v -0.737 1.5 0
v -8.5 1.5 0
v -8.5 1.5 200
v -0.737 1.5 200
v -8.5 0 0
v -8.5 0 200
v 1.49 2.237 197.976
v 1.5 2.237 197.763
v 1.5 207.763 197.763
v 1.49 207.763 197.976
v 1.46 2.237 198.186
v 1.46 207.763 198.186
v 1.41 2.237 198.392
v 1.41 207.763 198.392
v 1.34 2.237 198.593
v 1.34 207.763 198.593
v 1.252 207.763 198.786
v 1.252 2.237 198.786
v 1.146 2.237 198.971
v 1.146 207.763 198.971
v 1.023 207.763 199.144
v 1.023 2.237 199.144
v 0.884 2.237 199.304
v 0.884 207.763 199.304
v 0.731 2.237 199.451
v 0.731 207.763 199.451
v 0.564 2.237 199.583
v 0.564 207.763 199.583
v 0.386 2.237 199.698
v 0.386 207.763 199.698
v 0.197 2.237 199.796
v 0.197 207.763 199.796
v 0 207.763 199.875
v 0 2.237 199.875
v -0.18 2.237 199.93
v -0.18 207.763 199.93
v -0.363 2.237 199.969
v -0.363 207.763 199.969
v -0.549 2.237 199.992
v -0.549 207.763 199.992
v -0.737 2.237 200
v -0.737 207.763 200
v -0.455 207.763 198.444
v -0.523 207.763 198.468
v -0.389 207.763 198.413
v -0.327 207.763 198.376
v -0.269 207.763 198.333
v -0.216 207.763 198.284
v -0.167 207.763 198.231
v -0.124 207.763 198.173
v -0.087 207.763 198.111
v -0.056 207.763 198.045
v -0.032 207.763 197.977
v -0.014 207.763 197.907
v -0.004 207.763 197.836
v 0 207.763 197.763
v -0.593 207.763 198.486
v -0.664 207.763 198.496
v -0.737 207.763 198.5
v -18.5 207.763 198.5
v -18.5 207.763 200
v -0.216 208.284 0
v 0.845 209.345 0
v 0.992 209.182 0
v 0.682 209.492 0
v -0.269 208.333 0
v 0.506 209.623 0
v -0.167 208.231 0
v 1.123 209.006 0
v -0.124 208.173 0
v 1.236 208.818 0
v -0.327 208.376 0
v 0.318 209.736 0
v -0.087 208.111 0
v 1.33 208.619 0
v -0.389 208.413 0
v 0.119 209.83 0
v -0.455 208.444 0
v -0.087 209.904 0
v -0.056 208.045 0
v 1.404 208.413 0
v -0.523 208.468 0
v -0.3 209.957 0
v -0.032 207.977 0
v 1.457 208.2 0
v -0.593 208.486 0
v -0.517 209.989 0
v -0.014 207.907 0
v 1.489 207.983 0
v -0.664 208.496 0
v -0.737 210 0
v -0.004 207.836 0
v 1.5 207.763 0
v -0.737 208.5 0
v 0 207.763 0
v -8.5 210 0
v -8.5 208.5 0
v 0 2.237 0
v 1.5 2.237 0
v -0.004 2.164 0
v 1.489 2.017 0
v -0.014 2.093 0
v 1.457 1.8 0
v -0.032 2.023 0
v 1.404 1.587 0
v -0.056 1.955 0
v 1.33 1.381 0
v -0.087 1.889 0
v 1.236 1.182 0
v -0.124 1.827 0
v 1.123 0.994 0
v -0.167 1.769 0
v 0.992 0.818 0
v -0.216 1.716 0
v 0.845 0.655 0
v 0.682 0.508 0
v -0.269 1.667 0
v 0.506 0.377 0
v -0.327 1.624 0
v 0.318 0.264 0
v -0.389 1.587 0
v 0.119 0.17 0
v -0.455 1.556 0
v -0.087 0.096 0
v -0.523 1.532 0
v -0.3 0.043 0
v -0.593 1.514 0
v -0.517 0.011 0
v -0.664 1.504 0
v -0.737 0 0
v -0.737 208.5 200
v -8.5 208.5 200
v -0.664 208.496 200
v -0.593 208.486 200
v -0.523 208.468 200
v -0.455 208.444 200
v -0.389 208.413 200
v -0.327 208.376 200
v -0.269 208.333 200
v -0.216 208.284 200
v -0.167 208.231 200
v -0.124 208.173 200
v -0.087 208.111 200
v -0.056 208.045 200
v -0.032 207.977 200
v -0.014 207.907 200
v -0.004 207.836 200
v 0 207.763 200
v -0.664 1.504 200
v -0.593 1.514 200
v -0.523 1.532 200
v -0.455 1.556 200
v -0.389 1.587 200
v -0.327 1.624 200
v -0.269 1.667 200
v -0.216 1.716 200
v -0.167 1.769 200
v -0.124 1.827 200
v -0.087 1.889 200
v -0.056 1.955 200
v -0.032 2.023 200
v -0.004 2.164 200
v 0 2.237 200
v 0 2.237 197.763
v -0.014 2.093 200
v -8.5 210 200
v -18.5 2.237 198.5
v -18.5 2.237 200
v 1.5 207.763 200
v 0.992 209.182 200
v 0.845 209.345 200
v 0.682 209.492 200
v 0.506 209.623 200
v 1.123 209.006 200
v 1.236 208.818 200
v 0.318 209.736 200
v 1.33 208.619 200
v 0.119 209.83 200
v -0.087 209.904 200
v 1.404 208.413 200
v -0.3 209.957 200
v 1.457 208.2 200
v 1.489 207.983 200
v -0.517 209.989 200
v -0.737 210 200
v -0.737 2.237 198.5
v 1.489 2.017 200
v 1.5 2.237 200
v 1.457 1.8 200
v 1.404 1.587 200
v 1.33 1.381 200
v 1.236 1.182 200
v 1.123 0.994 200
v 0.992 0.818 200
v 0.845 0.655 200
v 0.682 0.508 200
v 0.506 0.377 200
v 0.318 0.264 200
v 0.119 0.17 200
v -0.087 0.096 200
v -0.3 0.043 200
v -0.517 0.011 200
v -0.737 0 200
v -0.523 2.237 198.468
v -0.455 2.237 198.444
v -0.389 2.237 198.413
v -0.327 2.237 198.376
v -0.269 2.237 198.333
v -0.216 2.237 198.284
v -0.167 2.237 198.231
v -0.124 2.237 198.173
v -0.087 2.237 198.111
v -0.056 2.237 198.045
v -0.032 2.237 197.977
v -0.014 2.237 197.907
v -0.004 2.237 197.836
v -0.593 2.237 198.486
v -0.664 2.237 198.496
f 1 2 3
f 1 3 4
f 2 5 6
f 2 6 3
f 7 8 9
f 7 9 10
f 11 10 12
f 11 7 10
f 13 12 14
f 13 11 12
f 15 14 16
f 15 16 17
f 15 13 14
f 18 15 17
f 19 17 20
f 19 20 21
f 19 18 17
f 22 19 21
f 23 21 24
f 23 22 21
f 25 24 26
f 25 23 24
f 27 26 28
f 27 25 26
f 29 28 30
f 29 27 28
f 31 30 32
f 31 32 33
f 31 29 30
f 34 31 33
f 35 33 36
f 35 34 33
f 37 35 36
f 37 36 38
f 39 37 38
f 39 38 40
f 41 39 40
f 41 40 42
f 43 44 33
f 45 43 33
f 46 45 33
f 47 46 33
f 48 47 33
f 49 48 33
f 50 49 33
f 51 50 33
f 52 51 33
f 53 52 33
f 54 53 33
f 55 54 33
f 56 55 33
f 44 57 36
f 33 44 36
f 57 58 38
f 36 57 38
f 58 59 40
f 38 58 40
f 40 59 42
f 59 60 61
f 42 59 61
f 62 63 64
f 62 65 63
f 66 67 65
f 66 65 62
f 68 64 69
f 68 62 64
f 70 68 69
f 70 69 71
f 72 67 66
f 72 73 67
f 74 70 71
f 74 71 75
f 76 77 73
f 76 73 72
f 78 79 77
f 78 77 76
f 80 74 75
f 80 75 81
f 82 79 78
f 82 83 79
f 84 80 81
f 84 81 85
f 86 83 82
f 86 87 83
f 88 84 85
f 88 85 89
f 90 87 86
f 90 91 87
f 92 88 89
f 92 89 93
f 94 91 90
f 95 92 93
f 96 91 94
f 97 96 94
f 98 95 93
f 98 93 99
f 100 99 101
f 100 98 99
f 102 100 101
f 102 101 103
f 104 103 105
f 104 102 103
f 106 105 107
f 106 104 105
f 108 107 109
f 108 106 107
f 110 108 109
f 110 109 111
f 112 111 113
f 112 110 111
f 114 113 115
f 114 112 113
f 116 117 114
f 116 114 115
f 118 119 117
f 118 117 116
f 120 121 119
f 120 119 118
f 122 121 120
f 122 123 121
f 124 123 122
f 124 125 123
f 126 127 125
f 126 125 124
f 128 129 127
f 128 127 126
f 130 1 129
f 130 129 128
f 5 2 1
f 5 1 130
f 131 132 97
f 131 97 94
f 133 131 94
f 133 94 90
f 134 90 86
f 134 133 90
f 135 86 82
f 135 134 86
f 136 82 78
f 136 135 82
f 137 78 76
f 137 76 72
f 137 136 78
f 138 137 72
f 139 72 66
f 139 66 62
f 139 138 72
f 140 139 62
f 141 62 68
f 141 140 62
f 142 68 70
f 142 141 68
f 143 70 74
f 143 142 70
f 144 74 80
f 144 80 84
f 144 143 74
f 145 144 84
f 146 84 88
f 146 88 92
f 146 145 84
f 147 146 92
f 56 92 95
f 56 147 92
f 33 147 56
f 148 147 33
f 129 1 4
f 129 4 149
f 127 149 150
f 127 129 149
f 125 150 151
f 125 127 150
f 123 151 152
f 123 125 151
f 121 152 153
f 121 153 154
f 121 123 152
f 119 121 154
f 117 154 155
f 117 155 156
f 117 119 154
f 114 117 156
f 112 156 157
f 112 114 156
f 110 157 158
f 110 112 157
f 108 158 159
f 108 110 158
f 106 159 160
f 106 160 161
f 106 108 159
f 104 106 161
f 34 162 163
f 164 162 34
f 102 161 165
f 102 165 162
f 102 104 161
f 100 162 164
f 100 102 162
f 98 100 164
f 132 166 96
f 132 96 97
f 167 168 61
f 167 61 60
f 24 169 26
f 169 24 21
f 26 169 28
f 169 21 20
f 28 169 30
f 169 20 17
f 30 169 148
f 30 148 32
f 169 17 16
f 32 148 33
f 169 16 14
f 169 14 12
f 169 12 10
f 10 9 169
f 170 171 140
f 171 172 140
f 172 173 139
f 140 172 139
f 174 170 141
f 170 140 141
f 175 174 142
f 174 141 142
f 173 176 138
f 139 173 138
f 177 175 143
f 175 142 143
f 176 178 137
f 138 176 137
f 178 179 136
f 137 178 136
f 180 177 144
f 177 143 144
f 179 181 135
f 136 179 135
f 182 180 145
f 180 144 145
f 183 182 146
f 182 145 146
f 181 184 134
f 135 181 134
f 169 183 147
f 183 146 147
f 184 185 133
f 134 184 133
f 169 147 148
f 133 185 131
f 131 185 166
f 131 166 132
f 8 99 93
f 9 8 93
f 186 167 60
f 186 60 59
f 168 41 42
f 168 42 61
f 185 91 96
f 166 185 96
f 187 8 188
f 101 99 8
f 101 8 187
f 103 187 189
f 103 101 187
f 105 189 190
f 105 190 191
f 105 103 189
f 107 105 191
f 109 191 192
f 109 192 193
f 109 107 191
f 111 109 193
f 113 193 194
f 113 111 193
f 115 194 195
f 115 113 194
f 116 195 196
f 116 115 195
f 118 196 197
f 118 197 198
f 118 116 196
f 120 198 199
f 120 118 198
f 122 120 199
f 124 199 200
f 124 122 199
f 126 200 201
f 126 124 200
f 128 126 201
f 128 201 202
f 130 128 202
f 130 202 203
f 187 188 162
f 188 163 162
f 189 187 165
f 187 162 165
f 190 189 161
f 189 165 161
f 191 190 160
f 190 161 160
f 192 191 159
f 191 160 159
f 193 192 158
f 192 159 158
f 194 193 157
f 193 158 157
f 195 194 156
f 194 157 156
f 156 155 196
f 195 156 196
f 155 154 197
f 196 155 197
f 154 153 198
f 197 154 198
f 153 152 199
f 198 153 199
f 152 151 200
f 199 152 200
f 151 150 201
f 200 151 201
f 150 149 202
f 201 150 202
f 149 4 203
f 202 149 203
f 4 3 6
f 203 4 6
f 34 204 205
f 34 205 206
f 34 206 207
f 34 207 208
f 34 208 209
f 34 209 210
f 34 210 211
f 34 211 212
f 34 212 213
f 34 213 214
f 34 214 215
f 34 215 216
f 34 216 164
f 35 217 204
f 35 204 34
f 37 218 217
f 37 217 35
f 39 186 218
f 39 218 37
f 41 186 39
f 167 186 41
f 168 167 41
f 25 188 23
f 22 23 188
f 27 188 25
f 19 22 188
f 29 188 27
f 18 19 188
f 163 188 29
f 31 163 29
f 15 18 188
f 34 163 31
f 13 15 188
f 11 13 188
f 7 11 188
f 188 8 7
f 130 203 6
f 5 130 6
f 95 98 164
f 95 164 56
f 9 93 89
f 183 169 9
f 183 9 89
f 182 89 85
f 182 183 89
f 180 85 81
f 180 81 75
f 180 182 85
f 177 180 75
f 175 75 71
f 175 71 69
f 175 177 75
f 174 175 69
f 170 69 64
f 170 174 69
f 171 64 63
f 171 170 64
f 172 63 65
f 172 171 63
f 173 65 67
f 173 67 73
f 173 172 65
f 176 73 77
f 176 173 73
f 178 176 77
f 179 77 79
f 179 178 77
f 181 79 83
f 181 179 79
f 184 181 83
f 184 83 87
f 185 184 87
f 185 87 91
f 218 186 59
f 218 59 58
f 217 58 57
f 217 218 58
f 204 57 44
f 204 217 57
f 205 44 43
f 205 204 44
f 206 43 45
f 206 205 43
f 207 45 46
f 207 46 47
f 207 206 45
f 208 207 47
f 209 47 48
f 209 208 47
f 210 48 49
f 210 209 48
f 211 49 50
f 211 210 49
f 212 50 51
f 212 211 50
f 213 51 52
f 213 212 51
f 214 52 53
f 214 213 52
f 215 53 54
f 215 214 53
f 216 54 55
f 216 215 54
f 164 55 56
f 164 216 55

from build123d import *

# Parameters (mm, degrees)
SKETCH_2_W                       = 1.5
SKETCH_2_H                       = 210
SM_BASE_FLANGE_1_DEPTH           = 200
SM_EDGE_FLANGE_1_STRIP_W         = 7.4732
SM_EDGE_FLANGE_1_STRIP_H         = 1.5
SM_EDGE_FLANGE_1_STRIP_CUT_DEPTH = 200
SM_EDGE_FLANGE_1_DEPTH           = 200
SM_EDGE_FLANGE_2_STRIP_W         = 7.4732
SM_EDGE_FLANGE_2_STRIP_H         = 1.5
SM_EDGE_FLANGE_2_STRIP_CUT_DEPTH = 200
SM_EDGE_FLANGE_2_DEPTH           = 200
SM_EDGE_FLANGE_3_STRIP_W         = 7.4732
SM_EDGE_FLANGE_3_STRIP_H         = 1.5
SM_EDGE_FLANGE_3_STRIP_CUT_DEPTH = 205.5268
SM_EDGE_FLANGE_3_DEPTH           = 205.5268


# Sheet-metal steps are written as plain solids
with BuildPart() as part:
    # Sketch 2 → 基体-法兰1 (new body)
    with BuildSketch(Plane.XY):
        with Locations((0.75, 105)):
            Rectangle(SKETCH_2_W, SKETCH_2_H)
    extrude(amount=SM_BASE_FLANGE_1_DEPTH)

    # 边线-法兰1 strip (across the edge) → 边线-法兰1 strip cut (cut)
    with BuildSketch(Plane(origin=(0, 210, 200), x_dir=(0, -1, 0), z_dir=(0, 0, -1))):
        with Locations((-1.5, -0.75)):
            Rectangle(SM_EDGE_FLANGE_1_STRIP_W, SM_EDGE_FLANGE_1_STRIP_H)
    extrude(amount=SM_EDGE_FLANGE_1_STRIP_CUT_DEPTH, mode=Mode.SUBTRACT)

    # 边线-法兰1 section (across the edge) → 边线-法兰1 (add)
    with BuildSketch(Plane(origin=(0, 210, 200), x_dir=(0, -1, 0), z_dir=(0, 0, -1))):
        with BuildLine():
            Line((0, 0.7366), (0, 8.5))
            Line((0, 8.5), (1.5, 8.5))
            Line((1.5, 8.5), (1.5, 0.7366))
            ThreePointArc((1.5, 0.7366), (1.715745145, 0.215745145), (2.2366, 0))
            Line((2.2366, 0), (2.2366, -1.5))
            ThreePointArc((2.2366, -1.5), (0.655084973, -0.844915027), (0, 0.7366))
        make_face()
    extrude(amount=SM_EDGE_FLANGE_1_DEPTH)

    # 边线-法兰2 strip (across the edge) → 边线-法兰2 strip cut (cut)
    with BuildSketch(Plane(origin=(0, 0, 0), x_dir=(0, 1, 0), z_dir=(0, 0, 1))):
        with Locations((-1.5, -0.75)):
            Rectangle(SM_EDGE_FLANGE_2_STRIP_W, SM_EDGE_FLANGE_2_STRIP_H)
    extrude(amount=SM_EDGE_FLANGE_2_STRIP_CUT_DEPTH, mode=Mode.SUBTRACT)

    # 边线-法兰2 section (across the edge) → 边线-法兰2 (add)
    with BuildSketch(Plane(origin=(0, 0, 0), x_dir=(0, 1, 0), z_dir=(0, 0, 1))):
        with BuildLine():
            Line((0, 0.7366), (0, 8.5))
            Line((0, 8.5), (1.5, 8.5))
            Line((1.5, 8.5), (1.5, 0.7366))
            ThreePointArc((1.5, 0.7366), (1.715745145, 0.215745145), (2.2366, 0))
            Line((2.2366, 0), (2.2366, -1.5))
            ThreePointArc((2.2366, -1.5), (0.655084973, -0.844915027), (0, 0.7366))
        make_face()
    extrude(amount=SM_EDGE_FLANGE_2_DEPTH)

    # 边线-法兰3 strip (across the edge) → 边线-法兰3 strip cut (cut)
    with BuildSketch(Plane(origin=(0, 2.2366, 200), x_dir=(0, 0, -1), z_dir=(0, 1, 0))):
        with Locations((-1.5, -0.75)):
            Rectangle(SM_EDGE_FLANGE_3_STRIP_W, SM_EDGE_FLANGE_3_STRIP_H)
    extrude(amount=SM_EDGE_FLANGE_3_STRIP_CUT_DEPTH, mode=Mode.SUBTRACT)

    # 边线-法兰3 section (across the edge) → 边线-法兰3 (add)
    with BuildSketch(Plane(origin=(0, 2.2366, 200), x_dir=(0, 0, -1), z_dir=(0, 1, 0))):
        with BuildLine():
            Line((0, 0.7366), (0, 18.5))
            Line((0, 18.5), (1.5, 18.5))
            Line((1.5, 18.5), (1.5, 0.7366))
            ThreePointArc((1.5, 0.7366), (1.715745145, 0.215745145), (2.2366, 0))
            Line((2.2366, 0), (2.2366, -1.5))
            ThreePointArc((2.2366, -1.5), (0.655084973, -0.844915027), (0, 0.7366))
        make_face()
    extrude(amount=SM_EDGE_FLANGE_3_DEPTH)


solid = part.part
